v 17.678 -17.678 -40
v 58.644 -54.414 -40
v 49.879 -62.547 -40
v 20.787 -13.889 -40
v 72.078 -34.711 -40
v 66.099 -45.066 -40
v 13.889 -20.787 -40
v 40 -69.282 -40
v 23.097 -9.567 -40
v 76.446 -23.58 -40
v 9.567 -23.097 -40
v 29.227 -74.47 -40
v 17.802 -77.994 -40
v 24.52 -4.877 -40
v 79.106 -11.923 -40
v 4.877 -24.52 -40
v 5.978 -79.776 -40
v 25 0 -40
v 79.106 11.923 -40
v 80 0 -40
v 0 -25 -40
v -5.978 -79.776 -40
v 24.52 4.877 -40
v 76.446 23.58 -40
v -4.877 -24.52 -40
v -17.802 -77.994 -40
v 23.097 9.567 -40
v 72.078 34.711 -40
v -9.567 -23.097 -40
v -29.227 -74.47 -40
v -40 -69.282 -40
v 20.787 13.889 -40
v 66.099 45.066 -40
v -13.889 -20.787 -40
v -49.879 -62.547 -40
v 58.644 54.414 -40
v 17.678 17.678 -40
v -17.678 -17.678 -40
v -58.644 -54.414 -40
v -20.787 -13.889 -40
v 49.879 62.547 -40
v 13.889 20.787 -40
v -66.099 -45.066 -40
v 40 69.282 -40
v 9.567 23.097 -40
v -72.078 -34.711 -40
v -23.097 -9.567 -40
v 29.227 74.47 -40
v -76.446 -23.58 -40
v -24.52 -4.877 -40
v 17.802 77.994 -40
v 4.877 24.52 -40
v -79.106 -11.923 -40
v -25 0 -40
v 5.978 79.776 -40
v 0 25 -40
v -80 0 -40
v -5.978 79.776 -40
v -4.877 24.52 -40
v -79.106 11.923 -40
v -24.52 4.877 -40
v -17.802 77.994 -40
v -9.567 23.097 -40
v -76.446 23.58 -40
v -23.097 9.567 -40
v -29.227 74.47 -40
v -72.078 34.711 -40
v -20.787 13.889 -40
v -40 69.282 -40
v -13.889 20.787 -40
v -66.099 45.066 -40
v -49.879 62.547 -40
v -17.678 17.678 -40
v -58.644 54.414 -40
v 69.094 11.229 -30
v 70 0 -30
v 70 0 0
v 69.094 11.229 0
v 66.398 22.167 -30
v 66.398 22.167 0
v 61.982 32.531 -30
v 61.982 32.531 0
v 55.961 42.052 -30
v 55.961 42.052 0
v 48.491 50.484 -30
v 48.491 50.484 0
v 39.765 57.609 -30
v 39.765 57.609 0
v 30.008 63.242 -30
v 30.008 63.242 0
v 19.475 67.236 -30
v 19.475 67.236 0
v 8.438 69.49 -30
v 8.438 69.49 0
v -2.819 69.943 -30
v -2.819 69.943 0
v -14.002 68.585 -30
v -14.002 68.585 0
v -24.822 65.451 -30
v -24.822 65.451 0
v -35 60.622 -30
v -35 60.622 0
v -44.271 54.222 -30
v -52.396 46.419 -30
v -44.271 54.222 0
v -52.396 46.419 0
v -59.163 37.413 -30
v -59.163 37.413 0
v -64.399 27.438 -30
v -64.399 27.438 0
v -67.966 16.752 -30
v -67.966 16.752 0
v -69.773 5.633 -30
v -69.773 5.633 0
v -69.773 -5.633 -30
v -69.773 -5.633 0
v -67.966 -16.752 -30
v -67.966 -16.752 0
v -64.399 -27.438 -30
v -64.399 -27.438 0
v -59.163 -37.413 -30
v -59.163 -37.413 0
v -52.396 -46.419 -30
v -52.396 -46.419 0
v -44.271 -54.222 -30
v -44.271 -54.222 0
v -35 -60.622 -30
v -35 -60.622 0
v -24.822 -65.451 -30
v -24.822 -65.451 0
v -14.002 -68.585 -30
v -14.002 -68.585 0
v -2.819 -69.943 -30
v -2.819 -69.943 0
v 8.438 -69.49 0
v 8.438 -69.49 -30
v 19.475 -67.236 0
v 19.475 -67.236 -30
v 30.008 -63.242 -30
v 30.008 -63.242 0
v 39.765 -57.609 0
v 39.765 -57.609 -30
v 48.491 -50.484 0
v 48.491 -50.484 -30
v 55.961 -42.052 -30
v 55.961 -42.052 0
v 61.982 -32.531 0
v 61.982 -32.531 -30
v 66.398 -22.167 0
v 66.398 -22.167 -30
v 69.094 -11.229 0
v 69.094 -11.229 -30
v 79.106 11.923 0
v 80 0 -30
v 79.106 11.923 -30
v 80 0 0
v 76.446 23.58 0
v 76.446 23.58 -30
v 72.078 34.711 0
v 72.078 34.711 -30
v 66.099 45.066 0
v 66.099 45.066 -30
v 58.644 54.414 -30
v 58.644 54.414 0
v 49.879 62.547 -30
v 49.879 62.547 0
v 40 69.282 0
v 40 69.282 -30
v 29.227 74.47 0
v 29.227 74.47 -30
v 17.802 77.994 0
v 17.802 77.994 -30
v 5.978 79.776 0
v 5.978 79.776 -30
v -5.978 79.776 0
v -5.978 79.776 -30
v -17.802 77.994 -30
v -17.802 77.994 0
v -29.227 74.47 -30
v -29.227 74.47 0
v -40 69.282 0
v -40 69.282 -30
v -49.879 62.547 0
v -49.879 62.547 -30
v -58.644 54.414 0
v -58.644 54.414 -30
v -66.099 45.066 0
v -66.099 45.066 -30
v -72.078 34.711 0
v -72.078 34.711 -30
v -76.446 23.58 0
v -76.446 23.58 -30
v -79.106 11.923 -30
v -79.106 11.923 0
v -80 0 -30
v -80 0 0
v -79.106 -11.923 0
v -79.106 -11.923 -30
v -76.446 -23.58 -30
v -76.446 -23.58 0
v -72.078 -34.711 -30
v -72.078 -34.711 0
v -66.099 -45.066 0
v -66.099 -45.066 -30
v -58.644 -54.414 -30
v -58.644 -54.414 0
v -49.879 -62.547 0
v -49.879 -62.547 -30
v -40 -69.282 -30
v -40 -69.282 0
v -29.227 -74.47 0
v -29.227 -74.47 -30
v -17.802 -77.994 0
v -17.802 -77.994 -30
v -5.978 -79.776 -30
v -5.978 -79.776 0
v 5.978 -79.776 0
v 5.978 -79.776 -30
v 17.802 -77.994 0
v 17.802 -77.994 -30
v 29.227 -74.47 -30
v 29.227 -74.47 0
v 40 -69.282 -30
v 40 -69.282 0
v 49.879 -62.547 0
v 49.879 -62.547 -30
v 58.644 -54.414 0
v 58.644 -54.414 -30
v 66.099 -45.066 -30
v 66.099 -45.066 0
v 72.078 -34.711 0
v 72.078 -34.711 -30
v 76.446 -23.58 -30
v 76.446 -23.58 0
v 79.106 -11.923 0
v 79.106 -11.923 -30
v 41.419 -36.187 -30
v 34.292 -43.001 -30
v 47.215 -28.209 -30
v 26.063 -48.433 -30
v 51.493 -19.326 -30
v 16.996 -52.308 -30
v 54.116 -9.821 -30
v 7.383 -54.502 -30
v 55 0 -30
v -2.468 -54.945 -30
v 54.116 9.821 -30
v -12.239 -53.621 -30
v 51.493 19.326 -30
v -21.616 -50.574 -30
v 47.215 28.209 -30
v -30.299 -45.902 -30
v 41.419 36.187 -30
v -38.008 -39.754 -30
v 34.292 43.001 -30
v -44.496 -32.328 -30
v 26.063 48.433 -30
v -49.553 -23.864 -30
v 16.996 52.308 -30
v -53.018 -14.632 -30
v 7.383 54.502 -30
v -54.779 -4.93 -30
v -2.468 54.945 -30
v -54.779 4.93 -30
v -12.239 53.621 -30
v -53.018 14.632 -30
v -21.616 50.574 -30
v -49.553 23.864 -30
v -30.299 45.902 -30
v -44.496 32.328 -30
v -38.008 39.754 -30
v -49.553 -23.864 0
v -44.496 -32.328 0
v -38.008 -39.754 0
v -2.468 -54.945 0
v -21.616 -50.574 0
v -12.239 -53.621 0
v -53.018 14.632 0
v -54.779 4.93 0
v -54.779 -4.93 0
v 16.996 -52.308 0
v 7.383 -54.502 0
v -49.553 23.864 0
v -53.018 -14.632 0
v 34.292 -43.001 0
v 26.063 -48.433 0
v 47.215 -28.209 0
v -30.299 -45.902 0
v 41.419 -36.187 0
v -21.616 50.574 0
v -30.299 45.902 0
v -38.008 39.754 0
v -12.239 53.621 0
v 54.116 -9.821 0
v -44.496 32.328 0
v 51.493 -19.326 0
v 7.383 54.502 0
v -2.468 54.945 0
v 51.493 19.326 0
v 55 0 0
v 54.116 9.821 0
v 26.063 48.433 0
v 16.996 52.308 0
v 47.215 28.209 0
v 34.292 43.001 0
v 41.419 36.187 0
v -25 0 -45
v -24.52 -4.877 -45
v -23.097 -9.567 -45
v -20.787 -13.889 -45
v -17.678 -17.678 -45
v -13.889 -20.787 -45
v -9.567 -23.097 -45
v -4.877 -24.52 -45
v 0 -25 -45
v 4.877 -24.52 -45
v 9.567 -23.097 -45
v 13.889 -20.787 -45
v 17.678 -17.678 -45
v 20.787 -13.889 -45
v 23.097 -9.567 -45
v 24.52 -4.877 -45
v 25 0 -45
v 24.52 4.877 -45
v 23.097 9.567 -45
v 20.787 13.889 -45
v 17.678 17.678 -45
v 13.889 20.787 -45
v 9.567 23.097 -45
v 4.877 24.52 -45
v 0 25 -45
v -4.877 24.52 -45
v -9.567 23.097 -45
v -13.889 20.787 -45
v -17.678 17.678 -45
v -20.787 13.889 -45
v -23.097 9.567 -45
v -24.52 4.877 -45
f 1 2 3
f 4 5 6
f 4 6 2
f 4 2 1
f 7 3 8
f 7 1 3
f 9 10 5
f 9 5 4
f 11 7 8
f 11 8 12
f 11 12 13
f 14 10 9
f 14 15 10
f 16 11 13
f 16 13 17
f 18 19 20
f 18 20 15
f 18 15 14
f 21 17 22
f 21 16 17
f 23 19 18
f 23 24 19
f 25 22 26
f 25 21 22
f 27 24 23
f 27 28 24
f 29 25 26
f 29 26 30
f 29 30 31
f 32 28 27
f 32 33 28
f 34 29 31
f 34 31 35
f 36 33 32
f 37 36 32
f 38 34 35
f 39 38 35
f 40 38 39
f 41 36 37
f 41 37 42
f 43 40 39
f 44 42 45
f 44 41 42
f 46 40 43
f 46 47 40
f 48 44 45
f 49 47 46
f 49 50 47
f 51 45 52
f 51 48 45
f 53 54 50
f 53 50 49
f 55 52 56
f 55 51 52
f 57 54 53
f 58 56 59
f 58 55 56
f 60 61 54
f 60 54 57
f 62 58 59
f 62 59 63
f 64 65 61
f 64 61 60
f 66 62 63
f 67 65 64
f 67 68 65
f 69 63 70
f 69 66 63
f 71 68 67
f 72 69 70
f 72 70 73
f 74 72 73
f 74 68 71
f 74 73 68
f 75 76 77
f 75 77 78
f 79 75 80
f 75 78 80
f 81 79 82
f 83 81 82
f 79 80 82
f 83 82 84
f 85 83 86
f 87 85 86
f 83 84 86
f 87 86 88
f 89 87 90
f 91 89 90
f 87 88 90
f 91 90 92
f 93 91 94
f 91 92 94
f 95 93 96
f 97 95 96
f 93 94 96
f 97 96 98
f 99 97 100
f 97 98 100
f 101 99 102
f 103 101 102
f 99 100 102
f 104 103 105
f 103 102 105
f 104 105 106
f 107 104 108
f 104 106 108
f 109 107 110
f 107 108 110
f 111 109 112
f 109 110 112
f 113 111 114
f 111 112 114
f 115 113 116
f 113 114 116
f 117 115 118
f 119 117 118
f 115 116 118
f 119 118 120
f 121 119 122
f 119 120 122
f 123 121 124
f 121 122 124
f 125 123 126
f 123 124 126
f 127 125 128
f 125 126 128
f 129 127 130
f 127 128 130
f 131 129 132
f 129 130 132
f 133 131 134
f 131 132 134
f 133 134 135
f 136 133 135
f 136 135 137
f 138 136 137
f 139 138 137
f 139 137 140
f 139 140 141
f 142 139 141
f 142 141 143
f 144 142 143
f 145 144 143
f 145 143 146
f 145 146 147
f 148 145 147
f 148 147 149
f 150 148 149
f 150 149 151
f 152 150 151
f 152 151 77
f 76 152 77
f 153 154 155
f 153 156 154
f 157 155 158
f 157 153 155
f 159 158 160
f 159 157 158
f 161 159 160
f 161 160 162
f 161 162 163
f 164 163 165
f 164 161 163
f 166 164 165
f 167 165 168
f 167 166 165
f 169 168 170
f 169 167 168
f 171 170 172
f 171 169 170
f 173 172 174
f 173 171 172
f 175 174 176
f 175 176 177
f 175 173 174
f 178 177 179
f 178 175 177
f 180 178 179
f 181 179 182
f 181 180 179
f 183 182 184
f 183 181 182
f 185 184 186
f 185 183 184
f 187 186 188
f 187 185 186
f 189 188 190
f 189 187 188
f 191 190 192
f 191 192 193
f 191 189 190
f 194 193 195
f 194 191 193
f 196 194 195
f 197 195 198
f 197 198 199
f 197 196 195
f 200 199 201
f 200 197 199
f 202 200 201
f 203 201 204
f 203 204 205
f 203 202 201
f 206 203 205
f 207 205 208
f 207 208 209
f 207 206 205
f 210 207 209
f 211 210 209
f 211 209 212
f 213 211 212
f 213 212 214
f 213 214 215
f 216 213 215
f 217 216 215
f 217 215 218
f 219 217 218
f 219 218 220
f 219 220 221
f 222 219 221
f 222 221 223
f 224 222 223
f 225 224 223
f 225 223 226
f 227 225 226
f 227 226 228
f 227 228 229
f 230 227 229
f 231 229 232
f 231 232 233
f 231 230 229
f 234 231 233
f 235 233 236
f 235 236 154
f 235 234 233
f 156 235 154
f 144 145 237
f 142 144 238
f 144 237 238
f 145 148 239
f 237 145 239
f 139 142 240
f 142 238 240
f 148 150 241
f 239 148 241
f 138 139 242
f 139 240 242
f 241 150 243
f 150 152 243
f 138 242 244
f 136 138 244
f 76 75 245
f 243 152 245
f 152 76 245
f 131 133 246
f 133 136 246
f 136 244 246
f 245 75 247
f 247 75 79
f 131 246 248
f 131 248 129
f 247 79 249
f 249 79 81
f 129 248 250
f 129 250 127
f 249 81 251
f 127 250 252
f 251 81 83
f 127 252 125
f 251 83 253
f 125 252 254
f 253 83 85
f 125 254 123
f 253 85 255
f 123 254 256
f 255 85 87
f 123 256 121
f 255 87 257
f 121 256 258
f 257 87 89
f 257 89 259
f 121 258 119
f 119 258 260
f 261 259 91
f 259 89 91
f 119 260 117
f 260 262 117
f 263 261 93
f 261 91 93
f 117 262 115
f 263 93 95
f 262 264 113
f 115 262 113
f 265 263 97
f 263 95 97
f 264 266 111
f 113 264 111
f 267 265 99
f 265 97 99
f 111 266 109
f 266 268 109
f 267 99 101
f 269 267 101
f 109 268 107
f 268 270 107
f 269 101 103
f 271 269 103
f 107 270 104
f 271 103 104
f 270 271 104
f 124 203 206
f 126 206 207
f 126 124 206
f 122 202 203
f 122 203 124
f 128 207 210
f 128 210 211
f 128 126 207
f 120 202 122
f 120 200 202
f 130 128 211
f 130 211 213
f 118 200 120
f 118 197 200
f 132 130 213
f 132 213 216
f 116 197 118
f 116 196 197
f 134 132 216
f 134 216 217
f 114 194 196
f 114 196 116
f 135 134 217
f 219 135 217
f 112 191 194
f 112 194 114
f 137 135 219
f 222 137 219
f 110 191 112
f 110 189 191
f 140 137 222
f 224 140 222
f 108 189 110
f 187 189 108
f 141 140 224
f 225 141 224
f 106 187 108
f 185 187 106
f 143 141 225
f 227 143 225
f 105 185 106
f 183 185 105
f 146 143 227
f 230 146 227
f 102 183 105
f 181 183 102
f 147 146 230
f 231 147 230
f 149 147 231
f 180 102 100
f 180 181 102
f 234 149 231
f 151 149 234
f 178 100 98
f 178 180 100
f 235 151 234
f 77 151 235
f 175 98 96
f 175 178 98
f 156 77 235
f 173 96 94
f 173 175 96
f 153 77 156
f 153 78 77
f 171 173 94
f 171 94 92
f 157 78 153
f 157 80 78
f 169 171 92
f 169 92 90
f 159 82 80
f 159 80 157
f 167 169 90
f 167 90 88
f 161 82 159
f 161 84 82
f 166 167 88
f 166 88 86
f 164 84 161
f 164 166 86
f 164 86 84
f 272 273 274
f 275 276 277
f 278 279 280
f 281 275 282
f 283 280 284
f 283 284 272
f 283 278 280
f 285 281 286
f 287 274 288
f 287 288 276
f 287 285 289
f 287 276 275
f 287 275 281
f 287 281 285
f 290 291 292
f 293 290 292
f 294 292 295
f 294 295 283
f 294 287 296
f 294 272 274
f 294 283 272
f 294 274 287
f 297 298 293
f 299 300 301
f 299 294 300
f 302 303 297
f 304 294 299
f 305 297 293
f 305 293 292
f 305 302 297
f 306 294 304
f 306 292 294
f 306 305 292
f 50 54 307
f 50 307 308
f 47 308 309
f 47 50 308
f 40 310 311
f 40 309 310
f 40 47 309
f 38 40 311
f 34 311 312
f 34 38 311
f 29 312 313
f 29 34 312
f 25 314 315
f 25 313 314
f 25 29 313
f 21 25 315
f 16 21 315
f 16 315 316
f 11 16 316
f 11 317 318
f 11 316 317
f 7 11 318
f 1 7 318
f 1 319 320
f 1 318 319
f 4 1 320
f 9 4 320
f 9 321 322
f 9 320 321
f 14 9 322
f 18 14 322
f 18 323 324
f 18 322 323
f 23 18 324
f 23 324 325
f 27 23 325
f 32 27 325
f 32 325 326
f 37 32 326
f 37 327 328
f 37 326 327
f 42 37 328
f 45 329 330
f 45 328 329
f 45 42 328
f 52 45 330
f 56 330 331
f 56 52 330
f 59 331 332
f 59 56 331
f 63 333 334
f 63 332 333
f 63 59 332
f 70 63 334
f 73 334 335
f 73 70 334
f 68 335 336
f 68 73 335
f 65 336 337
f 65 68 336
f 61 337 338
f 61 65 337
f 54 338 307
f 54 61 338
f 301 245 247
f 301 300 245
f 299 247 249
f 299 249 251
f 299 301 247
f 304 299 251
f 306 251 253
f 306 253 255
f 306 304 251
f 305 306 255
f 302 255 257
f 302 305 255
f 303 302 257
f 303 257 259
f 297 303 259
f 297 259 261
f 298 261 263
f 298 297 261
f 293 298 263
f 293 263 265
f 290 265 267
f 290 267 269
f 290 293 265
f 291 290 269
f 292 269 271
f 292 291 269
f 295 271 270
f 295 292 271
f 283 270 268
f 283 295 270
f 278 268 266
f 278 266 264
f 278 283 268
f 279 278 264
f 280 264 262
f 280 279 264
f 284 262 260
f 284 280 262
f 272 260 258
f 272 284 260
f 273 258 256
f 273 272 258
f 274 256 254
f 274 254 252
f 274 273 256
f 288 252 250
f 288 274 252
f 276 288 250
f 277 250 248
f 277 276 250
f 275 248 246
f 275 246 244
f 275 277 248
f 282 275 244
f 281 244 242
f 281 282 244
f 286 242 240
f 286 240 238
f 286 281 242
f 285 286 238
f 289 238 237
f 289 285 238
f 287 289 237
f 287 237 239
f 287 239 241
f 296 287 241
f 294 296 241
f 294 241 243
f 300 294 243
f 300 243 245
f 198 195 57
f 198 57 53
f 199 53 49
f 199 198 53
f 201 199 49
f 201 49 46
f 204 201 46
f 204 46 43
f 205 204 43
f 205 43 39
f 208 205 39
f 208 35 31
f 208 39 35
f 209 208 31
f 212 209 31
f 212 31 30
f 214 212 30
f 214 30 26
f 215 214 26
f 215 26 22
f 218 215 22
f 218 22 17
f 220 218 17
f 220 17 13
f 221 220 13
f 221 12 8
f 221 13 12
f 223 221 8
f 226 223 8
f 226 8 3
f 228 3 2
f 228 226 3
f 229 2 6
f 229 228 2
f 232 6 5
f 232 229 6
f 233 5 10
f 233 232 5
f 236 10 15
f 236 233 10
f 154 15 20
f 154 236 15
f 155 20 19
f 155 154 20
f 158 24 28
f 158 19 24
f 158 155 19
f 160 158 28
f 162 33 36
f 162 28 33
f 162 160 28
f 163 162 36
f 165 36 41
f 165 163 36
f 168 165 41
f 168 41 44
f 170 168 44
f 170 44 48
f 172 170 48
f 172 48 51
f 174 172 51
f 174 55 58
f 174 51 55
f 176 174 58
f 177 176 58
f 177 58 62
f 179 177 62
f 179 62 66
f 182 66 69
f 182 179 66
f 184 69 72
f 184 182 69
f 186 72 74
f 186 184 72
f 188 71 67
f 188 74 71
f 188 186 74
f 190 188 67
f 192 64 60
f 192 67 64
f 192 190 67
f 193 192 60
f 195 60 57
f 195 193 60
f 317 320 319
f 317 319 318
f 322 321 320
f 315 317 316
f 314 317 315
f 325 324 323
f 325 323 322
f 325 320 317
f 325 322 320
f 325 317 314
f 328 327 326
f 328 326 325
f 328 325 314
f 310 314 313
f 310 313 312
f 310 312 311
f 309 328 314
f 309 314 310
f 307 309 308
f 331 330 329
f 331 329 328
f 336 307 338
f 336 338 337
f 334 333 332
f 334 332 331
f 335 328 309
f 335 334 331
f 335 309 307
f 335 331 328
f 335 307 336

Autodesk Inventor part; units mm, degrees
ref_plane "YZ Plane" through (0, 0, 0) normal (1, 0, 0) x (0, 1, 0)
ref_plane "XZ Plane" through (0, 0, 0) normal (0, 1, 0) x (-1, 0, 0)
ref_plane "XY Plane" through (0, 0, 0) normal (0, 0, 1) x (1, 0, 0)
sketch "草圖1" plane through (0, 0, 0) normal (0, 0, 1) x (1, 0, 0)
  circle A0 centre (0, 0) radius 80
  circle A1 centre (0, 0) radius 70
  circle A2 centre (0, 0) radius 55
  dimension "d0" = 160
  dimension "d1" = 140
  dimension "d2" = 110
extrude "擠出1" add sketch "草圖1" against normal blind 30
sketch "草圖2" plane through (0, 0, -30) normal (0, 0, -1) x (-1, 0, 0)
  circle A0 centre (0, 0) radius 80 projected
extrude "擠出2" add sketch "草圖2" along normal blind 10
sketch "草圖3" plane through (0, 0, -40) normal (0, 0, -1) x (-1, 0, 0)
  circle A0 centre (0, 0) radius 25
  dimension "d7" = 50
extrude "擠出3" add sketch "草圖3" along normal blind 5
properties part number "螺旋鉤子底座"
